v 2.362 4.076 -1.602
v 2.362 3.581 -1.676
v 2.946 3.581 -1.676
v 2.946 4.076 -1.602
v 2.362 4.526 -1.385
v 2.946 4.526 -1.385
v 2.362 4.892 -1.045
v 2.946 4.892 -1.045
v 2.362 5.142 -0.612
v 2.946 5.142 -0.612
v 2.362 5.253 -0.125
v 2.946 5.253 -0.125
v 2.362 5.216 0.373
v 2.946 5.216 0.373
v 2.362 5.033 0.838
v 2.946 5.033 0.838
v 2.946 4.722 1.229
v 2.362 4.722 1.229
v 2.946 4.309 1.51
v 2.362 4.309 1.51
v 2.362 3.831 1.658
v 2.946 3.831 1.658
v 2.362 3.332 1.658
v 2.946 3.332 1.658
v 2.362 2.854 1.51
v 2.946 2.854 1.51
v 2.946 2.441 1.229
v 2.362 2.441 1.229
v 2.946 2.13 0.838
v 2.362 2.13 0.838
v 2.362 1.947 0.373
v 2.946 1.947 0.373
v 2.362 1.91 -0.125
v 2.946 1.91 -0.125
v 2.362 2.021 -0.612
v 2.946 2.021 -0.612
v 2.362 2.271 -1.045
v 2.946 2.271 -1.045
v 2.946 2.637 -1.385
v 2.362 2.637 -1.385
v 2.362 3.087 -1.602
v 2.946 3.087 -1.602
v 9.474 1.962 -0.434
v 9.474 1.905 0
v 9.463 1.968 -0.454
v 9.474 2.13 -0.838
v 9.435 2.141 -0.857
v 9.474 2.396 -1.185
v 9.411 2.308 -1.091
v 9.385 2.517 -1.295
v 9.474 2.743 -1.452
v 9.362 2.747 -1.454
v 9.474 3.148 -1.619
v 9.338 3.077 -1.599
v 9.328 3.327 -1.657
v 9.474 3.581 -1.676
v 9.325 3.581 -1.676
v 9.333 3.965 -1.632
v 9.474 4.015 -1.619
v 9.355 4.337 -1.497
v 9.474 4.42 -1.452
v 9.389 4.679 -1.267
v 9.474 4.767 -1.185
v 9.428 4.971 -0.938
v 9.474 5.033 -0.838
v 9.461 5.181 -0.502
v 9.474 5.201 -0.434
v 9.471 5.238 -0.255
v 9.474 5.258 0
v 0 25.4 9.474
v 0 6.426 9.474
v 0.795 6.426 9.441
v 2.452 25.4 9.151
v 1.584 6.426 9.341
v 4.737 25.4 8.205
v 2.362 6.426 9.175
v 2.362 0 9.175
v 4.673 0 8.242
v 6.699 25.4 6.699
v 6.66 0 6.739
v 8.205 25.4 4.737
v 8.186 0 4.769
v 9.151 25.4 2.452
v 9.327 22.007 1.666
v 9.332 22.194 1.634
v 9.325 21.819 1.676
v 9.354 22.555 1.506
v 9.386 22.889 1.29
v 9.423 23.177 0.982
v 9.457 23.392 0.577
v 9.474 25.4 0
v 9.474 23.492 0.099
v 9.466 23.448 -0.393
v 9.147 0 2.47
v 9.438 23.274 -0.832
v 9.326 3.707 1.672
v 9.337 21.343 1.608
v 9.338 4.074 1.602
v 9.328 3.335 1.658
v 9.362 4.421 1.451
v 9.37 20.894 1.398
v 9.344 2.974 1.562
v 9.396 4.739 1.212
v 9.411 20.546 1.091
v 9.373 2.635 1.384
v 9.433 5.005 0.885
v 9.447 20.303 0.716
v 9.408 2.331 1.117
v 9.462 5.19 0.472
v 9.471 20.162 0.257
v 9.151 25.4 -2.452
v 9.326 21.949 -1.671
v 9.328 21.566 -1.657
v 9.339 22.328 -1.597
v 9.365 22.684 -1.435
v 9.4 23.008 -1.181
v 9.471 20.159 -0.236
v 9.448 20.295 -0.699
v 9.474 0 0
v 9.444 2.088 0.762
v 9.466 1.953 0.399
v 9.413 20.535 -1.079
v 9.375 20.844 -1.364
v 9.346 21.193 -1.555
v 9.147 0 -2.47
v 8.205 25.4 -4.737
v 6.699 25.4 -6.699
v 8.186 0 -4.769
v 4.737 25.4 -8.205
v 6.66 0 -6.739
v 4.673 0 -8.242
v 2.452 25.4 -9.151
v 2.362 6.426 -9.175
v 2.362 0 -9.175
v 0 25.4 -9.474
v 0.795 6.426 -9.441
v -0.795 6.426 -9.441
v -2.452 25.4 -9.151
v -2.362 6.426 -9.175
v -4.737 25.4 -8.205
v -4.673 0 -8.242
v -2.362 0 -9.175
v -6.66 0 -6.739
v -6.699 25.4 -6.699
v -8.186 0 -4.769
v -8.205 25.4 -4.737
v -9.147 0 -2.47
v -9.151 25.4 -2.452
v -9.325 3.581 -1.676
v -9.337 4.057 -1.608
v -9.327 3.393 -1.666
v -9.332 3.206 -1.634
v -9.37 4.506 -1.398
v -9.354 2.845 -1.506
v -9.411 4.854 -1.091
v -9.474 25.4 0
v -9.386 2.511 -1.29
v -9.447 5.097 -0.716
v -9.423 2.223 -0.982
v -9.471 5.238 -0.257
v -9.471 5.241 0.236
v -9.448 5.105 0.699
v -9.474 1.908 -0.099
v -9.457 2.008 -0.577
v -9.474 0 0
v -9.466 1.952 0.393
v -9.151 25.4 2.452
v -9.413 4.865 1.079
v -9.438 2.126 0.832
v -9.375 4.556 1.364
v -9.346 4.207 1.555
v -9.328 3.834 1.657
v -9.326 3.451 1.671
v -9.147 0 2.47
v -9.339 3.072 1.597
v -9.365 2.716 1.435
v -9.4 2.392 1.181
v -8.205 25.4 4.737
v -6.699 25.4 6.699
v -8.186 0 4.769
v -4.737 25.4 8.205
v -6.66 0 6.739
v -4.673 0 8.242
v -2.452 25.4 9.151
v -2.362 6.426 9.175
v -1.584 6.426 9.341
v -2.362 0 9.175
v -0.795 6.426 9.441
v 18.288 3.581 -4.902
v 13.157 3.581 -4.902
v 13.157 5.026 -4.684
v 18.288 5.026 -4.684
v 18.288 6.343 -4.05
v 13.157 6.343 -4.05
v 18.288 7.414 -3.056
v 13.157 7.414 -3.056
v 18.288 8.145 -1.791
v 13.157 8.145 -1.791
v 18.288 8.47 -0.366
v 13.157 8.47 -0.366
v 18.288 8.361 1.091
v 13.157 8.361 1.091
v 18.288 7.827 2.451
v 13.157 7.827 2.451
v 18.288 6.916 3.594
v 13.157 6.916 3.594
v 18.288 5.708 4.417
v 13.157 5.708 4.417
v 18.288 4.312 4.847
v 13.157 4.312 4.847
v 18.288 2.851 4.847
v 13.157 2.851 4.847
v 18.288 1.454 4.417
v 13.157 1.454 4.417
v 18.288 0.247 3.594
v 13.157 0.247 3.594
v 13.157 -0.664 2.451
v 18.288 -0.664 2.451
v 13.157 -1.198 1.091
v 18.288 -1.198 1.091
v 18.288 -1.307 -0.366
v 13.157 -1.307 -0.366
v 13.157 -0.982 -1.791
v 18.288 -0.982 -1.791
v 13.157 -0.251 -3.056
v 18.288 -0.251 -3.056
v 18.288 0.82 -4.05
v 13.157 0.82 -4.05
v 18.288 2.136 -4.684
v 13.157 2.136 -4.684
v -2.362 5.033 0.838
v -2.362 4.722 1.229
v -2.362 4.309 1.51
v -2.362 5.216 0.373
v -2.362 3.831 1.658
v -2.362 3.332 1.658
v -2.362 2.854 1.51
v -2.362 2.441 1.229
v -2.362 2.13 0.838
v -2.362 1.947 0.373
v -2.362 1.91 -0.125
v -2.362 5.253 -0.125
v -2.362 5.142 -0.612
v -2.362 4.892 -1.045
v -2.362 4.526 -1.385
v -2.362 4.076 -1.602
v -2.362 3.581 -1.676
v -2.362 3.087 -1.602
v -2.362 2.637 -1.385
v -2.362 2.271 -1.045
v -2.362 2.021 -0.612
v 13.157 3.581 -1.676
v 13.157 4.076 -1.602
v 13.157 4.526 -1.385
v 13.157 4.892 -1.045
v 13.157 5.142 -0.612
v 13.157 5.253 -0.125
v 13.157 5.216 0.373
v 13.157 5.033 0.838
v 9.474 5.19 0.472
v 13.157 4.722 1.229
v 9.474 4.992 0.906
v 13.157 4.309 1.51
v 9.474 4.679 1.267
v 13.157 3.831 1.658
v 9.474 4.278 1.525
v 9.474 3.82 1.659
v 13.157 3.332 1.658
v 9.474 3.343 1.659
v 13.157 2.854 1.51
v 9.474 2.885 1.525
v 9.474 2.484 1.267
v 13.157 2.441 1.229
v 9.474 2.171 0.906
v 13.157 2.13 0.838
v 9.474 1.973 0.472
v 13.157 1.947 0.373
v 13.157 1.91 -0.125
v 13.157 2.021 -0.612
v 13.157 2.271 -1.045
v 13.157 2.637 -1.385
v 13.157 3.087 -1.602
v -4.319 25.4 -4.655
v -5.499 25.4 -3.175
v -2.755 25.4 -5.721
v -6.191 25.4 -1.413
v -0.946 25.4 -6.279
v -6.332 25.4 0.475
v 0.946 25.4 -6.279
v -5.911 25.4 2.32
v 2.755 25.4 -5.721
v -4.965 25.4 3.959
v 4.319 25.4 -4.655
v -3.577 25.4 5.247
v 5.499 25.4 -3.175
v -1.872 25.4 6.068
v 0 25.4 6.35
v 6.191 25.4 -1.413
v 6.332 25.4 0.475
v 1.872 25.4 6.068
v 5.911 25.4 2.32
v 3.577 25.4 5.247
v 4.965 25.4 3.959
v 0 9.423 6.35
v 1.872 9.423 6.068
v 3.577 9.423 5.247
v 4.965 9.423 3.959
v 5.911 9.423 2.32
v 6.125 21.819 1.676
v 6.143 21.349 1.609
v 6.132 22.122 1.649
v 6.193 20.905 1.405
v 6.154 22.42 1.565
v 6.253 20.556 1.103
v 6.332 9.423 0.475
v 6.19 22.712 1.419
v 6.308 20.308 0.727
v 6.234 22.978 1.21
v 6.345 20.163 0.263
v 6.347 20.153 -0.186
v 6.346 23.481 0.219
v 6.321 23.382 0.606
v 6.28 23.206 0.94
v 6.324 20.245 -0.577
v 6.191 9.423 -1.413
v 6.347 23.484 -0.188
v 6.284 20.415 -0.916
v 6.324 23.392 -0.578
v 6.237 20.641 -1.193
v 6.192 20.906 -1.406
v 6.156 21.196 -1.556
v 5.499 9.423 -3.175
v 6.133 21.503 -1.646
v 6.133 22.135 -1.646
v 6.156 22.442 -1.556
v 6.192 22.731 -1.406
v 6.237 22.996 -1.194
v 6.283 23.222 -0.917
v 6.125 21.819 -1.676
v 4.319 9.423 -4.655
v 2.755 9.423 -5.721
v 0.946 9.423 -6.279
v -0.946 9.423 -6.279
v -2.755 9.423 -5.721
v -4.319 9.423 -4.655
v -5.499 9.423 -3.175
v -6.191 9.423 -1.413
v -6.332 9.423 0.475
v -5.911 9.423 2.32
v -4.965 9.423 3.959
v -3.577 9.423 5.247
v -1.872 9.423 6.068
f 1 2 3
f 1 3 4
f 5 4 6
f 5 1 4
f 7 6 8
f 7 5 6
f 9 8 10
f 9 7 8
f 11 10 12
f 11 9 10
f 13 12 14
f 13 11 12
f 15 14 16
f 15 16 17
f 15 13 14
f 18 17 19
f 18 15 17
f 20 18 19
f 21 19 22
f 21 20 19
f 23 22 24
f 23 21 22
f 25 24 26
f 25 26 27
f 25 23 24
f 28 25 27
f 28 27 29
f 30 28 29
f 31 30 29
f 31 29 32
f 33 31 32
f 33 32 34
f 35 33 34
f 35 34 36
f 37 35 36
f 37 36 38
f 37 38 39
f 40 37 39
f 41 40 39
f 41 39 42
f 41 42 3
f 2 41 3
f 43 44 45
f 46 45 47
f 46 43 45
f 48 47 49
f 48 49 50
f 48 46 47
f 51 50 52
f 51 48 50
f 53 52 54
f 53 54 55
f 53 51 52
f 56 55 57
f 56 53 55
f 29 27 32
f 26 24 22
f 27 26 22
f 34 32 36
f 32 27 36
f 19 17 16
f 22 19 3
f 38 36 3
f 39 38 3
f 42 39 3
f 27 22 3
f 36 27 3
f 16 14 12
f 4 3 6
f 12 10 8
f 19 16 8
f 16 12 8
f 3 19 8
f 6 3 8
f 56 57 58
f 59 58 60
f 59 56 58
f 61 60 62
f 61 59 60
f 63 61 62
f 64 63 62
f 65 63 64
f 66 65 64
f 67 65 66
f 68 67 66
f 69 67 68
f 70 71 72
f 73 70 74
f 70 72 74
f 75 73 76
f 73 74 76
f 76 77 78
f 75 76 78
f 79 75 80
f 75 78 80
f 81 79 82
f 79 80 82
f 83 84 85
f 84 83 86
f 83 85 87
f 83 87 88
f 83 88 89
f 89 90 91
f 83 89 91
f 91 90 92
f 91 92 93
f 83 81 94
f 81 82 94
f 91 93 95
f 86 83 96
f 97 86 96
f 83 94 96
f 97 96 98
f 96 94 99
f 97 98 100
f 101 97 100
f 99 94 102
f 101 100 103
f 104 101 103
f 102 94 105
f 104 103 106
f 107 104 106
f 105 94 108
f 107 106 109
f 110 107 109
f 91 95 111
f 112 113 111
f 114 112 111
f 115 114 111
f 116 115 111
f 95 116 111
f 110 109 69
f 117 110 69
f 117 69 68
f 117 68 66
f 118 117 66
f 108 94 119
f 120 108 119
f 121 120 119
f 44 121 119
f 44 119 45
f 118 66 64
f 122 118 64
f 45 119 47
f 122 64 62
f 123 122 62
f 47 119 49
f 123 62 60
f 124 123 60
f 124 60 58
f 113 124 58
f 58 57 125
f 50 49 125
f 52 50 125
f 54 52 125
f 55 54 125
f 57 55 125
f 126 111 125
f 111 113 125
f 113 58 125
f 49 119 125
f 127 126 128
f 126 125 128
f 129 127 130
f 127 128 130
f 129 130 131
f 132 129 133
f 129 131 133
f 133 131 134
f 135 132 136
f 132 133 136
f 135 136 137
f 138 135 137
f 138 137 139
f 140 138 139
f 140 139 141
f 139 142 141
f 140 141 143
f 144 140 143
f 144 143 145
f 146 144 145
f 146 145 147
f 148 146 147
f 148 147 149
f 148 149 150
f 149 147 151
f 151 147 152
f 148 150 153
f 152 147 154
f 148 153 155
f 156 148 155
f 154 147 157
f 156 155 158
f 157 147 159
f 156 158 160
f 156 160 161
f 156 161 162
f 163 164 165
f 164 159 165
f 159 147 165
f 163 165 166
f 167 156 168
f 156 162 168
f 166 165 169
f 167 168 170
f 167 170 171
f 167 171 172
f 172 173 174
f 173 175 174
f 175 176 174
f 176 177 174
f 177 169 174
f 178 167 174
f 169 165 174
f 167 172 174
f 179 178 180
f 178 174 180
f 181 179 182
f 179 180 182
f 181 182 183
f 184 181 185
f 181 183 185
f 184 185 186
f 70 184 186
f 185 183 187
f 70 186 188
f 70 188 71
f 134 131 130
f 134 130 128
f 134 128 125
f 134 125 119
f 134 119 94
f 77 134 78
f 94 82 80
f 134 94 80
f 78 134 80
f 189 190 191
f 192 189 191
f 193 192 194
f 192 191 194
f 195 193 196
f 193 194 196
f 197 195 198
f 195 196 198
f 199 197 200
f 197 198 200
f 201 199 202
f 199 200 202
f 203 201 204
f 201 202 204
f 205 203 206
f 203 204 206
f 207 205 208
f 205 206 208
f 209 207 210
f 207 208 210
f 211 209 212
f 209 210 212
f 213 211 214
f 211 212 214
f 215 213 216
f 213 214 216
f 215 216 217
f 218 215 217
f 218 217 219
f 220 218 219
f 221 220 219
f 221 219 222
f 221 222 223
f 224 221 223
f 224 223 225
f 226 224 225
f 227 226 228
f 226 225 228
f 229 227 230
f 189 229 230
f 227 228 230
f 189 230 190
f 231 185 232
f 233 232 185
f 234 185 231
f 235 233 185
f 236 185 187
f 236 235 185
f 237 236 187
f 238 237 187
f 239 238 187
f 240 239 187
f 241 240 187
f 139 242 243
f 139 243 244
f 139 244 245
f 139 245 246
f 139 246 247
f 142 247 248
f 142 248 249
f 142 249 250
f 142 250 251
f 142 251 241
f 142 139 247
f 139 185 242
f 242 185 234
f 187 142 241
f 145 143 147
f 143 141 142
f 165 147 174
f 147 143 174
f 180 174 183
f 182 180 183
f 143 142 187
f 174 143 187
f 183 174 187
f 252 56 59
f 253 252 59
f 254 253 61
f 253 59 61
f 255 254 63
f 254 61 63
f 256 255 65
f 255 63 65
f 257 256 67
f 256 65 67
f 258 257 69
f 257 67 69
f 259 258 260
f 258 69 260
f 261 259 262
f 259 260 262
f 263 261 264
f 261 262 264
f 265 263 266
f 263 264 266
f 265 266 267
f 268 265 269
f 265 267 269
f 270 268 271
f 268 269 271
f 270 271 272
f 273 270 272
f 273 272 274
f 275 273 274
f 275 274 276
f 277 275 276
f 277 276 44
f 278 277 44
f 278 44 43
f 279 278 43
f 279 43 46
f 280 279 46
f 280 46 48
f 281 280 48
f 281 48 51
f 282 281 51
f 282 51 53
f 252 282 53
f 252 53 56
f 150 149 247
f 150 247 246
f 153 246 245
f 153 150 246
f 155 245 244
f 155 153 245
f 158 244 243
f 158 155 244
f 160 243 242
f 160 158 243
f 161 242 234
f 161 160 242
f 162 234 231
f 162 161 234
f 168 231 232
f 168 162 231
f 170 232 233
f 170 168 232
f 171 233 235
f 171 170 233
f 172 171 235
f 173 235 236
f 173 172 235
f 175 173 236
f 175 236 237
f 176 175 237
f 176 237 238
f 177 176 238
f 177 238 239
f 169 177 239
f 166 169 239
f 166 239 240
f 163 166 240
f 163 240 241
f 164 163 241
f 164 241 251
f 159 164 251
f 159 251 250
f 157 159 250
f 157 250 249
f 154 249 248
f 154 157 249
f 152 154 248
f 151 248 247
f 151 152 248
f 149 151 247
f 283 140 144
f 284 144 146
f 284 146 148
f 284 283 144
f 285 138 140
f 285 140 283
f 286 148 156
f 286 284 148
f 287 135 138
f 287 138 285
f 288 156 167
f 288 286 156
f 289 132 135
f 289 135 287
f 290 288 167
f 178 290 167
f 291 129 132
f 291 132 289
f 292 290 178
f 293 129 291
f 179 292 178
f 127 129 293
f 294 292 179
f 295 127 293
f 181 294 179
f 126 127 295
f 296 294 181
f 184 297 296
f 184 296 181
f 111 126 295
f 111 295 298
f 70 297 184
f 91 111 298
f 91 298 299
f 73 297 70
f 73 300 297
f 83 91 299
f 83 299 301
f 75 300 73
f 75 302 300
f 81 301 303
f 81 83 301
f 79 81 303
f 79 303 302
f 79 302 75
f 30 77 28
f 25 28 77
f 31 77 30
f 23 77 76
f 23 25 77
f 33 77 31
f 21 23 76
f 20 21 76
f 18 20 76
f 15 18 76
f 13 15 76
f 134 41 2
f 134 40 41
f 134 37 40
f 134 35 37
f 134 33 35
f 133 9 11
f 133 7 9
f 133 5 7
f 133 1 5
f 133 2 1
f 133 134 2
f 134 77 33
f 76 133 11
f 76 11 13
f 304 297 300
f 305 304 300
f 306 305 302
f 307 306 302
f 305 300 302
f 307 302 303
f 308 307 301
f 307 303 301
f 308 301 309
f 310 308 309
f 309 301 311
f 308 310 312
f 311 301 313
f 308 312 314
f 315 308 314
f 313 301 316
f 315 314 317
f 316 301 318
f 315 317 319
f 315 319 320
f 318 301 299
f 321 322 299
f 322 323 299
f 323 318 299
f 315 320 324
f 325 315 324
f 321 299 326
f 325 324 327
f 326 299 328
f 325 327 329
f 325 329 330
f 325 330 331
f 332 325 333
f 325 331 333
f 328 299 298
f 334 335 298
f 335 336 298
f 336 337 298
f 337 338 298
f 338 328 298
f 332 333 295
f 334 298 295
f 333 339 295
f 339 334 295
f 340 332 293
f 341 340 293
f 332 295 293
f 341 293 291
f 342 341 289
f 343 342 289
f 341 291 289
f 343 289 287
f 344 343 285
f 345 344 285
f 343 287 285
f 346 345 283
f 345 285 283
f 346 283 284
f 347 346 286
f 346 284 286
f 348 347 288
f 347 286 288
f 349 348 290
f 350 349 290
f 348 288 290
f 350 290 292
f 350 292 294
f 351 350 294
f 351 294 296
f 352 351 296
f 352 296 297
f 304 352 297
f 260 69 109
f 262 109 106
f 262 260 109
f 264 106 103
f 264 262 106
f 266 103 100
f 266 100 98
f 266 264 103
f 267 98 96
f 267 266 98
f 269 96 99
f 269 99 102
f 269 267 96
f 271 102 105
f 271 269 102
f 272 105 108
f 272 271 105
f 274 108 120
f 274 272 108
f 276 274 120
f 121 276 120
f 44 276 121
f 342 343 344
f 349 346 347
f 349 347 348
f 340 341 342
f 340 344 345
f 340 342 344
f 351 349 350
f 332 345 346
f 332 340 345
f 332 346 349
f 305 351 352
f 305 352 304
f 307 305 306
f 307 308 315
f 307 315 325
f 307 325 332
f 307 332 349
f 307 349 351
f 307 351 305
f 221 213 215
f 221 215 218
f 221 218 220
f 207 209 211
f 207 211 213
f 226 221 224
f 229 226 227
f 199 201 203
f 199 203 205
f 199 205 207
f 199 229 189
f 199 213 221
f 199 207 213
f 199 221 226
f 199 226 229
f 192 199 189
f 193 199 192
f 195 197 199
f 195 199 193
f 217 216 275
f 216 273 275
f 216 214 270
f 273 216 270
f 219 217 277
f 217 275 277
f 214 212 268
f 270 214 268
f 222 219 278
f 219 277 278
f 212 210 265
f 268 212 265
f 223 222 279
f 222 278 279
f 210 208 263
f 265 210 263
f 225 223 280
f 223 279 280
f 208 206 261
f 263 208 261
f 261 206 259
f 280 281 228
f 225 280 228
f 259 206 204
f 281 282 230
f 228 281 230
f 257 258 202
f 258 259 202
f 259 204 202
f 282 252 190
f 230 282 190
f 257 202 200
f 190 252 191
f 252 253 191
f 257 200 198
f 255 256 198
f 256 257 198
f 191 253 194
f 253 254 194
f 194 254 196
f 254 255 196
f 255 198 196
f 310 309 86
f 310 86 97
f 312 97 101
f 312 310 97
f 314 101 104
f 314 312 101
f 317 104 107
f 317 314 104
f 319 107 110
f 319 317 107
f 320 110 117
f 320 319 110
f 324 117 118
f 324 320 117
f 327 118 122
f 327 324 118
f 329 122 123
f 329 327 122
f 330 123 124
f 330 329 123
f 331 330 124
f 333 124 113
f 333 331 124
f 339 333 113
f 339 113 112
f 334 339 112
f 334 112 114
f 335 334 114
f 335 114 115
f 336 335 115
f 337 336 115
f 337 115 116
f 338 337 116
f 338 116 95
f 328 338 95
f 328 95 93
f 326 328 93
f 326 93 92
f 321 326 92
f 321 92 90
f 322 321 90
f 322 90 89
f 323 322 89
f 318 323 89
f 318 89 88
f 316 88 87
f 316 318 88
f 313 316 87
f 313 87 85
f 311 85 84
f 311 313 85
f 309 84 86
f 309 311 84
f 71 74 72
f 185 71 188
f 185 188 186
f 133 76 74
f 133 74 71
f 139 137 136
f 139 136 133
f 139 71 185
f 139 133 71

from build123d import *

# Parameters (mm, degrees)
SKETCH1_R               = 9.4742
BOSS_EXTRUDE1_DEPTH     = 25.4
SKETCH2_R               = 6.35
CUT_EXTRUDE1_DEPTH      = 15.9766
CUT_EXTRUDE2_DEPTH      = 29.717258422
CUT_EXTRUDE2_DEPTH_BACK = 29.717258422
CUT_EXTRUDE3_DEPTH      = 29.717258422
CUT_EXTRUDE3_DEPTH_BACK = 29.717258422
SKETCH4_R               = 1.6764
SKETCH5_R               = 1.6764
CUT_EXTRUDE4_DEPTH      = 29.717258577
SKETCH6_R               = 1.6764
BOSS_EXTRUDE2_DEPTH     = 3.683
SKETCH7_R               = 4.9022
BOSS_EXTRUDE3_DEPTH     = 5.1308
SKETCH8_R               = 1.6764
BOSS_EXTRUDE4_DEPTH     = 6.5278


with BuildPart() as part:
    # Sketch1 → Boss-Extrude1 (new body)
    with BuildSketch(Plane(origin=(0, 0, 0), x_dir=(1, 0, 0), z_dir=(0, 1, 0))):
        with Locations(Location((0, 0, 0), (0, 0, 270))):
            Circle(SKETCH1_R)
    extrude(amount=BOSS_EXTRUDE1_DEPTH)

    # Sketch2 → Cut-Extrude1 (cut)
    with BuildSketch(Plane(origin=(0, 25.4, 0), x_dir=(1, 0, 0), z_dir=(0, 1, 0))):
        with Locations(Location((0, 0, 0), (0, 0, 270))):
            Circle(SKETCH2_R)
    extrude(amount=-CUT_EXTRUDE1_DEPTH, mode=Mode.SUBTRACT)

    # Sketch3 → Cut-Extrude2 (cut, two sides: drawn at the far end of the back side and taken through both)
    with BuildSketch(Plane.XY.offset(-CUT_EXTRUDE2_DEPTH_BACK)):
        Polygon((0, 0), (2.3622, 0), (2.3622, 6.4262), (-2.3622, 6.4262), (-2.3622, 0), align=None)
    extrude(amount=CUT_EXTRUDE2_DEPTH + CUT_EXTRUDE2_DEPTH_BACK, mode=Mode.SUBTRACT)

    # Sketch4 → Cut-Extrude3 (cut, two sides: drawn at the far end of the back side and taken through both)
    with BuildSketch(Plane(origin=(0, 0, 0), x_dir=(0, 0, -1), z_dir=(1, 0, 0)).offset(-CUT_EXTRUDE3_DEPTH_BACK)):
        with Locations((0, 3.5814)):
            Circle(SKETCH4_R)
    extrude(amount=CUT_EXTRUDE3_DEPTH + CUT_EXTRUDE3_DEPTH_BACK, mode=Mode.SUBTRACT)

    # Sketch5 → Cut-Extrude4 (cut, through all)
    with BuildSketch(Plane(origin=(0, 0, 0), x_dir=(0, 0, -1), z_dir=(1, 0, 0))):
        with Locations(Location((0, 21.8186, 0), (0, 0, 180))):
            Circle(SKETCH5_R)
    extrude(amount=CUT_EXTRUDE4_DEPTH, mode=Mode.SUBTRACT)



with BuildPart() as body_2:
    # Sketch6 → Boss-Extrude2 (new body)
    with BuildSketch(Plane(origin=(9.4742, 0, 0), x_dir=(0, 0, -1), z_dir=(1, 0, 0))):
        with Locations((0, 3.5814)):
            Circle(SKETCH6_R)
    extrude(amount=BOSS_EXTRUDE2_DEPTH)

    # Sketch7 → Boss-Extrude3 (add)
    with BuildSketch(Plane(origin=(13.1572, 0, 0), x_dir=(0, 0, -1), z_dir=(1, 0, 0))):
        with Locations((0, 3.5814)):
            Circle(SKETCH7_R)
    extrude(amount=BOSS_EXTRUDE3_DEPTH)


with BuildPart() as part_1:
    add(part.part)

    add(body_2.part)  # Boss-Extrude4 merges body 2
    # Sketch8 → Boss-Extrude4 (add)
    with BuildSketch(Plane(origin=(9.4742, 0, 0), x_dir=(0, 0, -1), z_dir=(1, 0, 0))):
        with Locations((0, 3.5814)):
            Circle(SKETCH8_R)
    extrude(amount=-BOSS_EXTRUDE4_DEPTH)


solid = part_1.part
